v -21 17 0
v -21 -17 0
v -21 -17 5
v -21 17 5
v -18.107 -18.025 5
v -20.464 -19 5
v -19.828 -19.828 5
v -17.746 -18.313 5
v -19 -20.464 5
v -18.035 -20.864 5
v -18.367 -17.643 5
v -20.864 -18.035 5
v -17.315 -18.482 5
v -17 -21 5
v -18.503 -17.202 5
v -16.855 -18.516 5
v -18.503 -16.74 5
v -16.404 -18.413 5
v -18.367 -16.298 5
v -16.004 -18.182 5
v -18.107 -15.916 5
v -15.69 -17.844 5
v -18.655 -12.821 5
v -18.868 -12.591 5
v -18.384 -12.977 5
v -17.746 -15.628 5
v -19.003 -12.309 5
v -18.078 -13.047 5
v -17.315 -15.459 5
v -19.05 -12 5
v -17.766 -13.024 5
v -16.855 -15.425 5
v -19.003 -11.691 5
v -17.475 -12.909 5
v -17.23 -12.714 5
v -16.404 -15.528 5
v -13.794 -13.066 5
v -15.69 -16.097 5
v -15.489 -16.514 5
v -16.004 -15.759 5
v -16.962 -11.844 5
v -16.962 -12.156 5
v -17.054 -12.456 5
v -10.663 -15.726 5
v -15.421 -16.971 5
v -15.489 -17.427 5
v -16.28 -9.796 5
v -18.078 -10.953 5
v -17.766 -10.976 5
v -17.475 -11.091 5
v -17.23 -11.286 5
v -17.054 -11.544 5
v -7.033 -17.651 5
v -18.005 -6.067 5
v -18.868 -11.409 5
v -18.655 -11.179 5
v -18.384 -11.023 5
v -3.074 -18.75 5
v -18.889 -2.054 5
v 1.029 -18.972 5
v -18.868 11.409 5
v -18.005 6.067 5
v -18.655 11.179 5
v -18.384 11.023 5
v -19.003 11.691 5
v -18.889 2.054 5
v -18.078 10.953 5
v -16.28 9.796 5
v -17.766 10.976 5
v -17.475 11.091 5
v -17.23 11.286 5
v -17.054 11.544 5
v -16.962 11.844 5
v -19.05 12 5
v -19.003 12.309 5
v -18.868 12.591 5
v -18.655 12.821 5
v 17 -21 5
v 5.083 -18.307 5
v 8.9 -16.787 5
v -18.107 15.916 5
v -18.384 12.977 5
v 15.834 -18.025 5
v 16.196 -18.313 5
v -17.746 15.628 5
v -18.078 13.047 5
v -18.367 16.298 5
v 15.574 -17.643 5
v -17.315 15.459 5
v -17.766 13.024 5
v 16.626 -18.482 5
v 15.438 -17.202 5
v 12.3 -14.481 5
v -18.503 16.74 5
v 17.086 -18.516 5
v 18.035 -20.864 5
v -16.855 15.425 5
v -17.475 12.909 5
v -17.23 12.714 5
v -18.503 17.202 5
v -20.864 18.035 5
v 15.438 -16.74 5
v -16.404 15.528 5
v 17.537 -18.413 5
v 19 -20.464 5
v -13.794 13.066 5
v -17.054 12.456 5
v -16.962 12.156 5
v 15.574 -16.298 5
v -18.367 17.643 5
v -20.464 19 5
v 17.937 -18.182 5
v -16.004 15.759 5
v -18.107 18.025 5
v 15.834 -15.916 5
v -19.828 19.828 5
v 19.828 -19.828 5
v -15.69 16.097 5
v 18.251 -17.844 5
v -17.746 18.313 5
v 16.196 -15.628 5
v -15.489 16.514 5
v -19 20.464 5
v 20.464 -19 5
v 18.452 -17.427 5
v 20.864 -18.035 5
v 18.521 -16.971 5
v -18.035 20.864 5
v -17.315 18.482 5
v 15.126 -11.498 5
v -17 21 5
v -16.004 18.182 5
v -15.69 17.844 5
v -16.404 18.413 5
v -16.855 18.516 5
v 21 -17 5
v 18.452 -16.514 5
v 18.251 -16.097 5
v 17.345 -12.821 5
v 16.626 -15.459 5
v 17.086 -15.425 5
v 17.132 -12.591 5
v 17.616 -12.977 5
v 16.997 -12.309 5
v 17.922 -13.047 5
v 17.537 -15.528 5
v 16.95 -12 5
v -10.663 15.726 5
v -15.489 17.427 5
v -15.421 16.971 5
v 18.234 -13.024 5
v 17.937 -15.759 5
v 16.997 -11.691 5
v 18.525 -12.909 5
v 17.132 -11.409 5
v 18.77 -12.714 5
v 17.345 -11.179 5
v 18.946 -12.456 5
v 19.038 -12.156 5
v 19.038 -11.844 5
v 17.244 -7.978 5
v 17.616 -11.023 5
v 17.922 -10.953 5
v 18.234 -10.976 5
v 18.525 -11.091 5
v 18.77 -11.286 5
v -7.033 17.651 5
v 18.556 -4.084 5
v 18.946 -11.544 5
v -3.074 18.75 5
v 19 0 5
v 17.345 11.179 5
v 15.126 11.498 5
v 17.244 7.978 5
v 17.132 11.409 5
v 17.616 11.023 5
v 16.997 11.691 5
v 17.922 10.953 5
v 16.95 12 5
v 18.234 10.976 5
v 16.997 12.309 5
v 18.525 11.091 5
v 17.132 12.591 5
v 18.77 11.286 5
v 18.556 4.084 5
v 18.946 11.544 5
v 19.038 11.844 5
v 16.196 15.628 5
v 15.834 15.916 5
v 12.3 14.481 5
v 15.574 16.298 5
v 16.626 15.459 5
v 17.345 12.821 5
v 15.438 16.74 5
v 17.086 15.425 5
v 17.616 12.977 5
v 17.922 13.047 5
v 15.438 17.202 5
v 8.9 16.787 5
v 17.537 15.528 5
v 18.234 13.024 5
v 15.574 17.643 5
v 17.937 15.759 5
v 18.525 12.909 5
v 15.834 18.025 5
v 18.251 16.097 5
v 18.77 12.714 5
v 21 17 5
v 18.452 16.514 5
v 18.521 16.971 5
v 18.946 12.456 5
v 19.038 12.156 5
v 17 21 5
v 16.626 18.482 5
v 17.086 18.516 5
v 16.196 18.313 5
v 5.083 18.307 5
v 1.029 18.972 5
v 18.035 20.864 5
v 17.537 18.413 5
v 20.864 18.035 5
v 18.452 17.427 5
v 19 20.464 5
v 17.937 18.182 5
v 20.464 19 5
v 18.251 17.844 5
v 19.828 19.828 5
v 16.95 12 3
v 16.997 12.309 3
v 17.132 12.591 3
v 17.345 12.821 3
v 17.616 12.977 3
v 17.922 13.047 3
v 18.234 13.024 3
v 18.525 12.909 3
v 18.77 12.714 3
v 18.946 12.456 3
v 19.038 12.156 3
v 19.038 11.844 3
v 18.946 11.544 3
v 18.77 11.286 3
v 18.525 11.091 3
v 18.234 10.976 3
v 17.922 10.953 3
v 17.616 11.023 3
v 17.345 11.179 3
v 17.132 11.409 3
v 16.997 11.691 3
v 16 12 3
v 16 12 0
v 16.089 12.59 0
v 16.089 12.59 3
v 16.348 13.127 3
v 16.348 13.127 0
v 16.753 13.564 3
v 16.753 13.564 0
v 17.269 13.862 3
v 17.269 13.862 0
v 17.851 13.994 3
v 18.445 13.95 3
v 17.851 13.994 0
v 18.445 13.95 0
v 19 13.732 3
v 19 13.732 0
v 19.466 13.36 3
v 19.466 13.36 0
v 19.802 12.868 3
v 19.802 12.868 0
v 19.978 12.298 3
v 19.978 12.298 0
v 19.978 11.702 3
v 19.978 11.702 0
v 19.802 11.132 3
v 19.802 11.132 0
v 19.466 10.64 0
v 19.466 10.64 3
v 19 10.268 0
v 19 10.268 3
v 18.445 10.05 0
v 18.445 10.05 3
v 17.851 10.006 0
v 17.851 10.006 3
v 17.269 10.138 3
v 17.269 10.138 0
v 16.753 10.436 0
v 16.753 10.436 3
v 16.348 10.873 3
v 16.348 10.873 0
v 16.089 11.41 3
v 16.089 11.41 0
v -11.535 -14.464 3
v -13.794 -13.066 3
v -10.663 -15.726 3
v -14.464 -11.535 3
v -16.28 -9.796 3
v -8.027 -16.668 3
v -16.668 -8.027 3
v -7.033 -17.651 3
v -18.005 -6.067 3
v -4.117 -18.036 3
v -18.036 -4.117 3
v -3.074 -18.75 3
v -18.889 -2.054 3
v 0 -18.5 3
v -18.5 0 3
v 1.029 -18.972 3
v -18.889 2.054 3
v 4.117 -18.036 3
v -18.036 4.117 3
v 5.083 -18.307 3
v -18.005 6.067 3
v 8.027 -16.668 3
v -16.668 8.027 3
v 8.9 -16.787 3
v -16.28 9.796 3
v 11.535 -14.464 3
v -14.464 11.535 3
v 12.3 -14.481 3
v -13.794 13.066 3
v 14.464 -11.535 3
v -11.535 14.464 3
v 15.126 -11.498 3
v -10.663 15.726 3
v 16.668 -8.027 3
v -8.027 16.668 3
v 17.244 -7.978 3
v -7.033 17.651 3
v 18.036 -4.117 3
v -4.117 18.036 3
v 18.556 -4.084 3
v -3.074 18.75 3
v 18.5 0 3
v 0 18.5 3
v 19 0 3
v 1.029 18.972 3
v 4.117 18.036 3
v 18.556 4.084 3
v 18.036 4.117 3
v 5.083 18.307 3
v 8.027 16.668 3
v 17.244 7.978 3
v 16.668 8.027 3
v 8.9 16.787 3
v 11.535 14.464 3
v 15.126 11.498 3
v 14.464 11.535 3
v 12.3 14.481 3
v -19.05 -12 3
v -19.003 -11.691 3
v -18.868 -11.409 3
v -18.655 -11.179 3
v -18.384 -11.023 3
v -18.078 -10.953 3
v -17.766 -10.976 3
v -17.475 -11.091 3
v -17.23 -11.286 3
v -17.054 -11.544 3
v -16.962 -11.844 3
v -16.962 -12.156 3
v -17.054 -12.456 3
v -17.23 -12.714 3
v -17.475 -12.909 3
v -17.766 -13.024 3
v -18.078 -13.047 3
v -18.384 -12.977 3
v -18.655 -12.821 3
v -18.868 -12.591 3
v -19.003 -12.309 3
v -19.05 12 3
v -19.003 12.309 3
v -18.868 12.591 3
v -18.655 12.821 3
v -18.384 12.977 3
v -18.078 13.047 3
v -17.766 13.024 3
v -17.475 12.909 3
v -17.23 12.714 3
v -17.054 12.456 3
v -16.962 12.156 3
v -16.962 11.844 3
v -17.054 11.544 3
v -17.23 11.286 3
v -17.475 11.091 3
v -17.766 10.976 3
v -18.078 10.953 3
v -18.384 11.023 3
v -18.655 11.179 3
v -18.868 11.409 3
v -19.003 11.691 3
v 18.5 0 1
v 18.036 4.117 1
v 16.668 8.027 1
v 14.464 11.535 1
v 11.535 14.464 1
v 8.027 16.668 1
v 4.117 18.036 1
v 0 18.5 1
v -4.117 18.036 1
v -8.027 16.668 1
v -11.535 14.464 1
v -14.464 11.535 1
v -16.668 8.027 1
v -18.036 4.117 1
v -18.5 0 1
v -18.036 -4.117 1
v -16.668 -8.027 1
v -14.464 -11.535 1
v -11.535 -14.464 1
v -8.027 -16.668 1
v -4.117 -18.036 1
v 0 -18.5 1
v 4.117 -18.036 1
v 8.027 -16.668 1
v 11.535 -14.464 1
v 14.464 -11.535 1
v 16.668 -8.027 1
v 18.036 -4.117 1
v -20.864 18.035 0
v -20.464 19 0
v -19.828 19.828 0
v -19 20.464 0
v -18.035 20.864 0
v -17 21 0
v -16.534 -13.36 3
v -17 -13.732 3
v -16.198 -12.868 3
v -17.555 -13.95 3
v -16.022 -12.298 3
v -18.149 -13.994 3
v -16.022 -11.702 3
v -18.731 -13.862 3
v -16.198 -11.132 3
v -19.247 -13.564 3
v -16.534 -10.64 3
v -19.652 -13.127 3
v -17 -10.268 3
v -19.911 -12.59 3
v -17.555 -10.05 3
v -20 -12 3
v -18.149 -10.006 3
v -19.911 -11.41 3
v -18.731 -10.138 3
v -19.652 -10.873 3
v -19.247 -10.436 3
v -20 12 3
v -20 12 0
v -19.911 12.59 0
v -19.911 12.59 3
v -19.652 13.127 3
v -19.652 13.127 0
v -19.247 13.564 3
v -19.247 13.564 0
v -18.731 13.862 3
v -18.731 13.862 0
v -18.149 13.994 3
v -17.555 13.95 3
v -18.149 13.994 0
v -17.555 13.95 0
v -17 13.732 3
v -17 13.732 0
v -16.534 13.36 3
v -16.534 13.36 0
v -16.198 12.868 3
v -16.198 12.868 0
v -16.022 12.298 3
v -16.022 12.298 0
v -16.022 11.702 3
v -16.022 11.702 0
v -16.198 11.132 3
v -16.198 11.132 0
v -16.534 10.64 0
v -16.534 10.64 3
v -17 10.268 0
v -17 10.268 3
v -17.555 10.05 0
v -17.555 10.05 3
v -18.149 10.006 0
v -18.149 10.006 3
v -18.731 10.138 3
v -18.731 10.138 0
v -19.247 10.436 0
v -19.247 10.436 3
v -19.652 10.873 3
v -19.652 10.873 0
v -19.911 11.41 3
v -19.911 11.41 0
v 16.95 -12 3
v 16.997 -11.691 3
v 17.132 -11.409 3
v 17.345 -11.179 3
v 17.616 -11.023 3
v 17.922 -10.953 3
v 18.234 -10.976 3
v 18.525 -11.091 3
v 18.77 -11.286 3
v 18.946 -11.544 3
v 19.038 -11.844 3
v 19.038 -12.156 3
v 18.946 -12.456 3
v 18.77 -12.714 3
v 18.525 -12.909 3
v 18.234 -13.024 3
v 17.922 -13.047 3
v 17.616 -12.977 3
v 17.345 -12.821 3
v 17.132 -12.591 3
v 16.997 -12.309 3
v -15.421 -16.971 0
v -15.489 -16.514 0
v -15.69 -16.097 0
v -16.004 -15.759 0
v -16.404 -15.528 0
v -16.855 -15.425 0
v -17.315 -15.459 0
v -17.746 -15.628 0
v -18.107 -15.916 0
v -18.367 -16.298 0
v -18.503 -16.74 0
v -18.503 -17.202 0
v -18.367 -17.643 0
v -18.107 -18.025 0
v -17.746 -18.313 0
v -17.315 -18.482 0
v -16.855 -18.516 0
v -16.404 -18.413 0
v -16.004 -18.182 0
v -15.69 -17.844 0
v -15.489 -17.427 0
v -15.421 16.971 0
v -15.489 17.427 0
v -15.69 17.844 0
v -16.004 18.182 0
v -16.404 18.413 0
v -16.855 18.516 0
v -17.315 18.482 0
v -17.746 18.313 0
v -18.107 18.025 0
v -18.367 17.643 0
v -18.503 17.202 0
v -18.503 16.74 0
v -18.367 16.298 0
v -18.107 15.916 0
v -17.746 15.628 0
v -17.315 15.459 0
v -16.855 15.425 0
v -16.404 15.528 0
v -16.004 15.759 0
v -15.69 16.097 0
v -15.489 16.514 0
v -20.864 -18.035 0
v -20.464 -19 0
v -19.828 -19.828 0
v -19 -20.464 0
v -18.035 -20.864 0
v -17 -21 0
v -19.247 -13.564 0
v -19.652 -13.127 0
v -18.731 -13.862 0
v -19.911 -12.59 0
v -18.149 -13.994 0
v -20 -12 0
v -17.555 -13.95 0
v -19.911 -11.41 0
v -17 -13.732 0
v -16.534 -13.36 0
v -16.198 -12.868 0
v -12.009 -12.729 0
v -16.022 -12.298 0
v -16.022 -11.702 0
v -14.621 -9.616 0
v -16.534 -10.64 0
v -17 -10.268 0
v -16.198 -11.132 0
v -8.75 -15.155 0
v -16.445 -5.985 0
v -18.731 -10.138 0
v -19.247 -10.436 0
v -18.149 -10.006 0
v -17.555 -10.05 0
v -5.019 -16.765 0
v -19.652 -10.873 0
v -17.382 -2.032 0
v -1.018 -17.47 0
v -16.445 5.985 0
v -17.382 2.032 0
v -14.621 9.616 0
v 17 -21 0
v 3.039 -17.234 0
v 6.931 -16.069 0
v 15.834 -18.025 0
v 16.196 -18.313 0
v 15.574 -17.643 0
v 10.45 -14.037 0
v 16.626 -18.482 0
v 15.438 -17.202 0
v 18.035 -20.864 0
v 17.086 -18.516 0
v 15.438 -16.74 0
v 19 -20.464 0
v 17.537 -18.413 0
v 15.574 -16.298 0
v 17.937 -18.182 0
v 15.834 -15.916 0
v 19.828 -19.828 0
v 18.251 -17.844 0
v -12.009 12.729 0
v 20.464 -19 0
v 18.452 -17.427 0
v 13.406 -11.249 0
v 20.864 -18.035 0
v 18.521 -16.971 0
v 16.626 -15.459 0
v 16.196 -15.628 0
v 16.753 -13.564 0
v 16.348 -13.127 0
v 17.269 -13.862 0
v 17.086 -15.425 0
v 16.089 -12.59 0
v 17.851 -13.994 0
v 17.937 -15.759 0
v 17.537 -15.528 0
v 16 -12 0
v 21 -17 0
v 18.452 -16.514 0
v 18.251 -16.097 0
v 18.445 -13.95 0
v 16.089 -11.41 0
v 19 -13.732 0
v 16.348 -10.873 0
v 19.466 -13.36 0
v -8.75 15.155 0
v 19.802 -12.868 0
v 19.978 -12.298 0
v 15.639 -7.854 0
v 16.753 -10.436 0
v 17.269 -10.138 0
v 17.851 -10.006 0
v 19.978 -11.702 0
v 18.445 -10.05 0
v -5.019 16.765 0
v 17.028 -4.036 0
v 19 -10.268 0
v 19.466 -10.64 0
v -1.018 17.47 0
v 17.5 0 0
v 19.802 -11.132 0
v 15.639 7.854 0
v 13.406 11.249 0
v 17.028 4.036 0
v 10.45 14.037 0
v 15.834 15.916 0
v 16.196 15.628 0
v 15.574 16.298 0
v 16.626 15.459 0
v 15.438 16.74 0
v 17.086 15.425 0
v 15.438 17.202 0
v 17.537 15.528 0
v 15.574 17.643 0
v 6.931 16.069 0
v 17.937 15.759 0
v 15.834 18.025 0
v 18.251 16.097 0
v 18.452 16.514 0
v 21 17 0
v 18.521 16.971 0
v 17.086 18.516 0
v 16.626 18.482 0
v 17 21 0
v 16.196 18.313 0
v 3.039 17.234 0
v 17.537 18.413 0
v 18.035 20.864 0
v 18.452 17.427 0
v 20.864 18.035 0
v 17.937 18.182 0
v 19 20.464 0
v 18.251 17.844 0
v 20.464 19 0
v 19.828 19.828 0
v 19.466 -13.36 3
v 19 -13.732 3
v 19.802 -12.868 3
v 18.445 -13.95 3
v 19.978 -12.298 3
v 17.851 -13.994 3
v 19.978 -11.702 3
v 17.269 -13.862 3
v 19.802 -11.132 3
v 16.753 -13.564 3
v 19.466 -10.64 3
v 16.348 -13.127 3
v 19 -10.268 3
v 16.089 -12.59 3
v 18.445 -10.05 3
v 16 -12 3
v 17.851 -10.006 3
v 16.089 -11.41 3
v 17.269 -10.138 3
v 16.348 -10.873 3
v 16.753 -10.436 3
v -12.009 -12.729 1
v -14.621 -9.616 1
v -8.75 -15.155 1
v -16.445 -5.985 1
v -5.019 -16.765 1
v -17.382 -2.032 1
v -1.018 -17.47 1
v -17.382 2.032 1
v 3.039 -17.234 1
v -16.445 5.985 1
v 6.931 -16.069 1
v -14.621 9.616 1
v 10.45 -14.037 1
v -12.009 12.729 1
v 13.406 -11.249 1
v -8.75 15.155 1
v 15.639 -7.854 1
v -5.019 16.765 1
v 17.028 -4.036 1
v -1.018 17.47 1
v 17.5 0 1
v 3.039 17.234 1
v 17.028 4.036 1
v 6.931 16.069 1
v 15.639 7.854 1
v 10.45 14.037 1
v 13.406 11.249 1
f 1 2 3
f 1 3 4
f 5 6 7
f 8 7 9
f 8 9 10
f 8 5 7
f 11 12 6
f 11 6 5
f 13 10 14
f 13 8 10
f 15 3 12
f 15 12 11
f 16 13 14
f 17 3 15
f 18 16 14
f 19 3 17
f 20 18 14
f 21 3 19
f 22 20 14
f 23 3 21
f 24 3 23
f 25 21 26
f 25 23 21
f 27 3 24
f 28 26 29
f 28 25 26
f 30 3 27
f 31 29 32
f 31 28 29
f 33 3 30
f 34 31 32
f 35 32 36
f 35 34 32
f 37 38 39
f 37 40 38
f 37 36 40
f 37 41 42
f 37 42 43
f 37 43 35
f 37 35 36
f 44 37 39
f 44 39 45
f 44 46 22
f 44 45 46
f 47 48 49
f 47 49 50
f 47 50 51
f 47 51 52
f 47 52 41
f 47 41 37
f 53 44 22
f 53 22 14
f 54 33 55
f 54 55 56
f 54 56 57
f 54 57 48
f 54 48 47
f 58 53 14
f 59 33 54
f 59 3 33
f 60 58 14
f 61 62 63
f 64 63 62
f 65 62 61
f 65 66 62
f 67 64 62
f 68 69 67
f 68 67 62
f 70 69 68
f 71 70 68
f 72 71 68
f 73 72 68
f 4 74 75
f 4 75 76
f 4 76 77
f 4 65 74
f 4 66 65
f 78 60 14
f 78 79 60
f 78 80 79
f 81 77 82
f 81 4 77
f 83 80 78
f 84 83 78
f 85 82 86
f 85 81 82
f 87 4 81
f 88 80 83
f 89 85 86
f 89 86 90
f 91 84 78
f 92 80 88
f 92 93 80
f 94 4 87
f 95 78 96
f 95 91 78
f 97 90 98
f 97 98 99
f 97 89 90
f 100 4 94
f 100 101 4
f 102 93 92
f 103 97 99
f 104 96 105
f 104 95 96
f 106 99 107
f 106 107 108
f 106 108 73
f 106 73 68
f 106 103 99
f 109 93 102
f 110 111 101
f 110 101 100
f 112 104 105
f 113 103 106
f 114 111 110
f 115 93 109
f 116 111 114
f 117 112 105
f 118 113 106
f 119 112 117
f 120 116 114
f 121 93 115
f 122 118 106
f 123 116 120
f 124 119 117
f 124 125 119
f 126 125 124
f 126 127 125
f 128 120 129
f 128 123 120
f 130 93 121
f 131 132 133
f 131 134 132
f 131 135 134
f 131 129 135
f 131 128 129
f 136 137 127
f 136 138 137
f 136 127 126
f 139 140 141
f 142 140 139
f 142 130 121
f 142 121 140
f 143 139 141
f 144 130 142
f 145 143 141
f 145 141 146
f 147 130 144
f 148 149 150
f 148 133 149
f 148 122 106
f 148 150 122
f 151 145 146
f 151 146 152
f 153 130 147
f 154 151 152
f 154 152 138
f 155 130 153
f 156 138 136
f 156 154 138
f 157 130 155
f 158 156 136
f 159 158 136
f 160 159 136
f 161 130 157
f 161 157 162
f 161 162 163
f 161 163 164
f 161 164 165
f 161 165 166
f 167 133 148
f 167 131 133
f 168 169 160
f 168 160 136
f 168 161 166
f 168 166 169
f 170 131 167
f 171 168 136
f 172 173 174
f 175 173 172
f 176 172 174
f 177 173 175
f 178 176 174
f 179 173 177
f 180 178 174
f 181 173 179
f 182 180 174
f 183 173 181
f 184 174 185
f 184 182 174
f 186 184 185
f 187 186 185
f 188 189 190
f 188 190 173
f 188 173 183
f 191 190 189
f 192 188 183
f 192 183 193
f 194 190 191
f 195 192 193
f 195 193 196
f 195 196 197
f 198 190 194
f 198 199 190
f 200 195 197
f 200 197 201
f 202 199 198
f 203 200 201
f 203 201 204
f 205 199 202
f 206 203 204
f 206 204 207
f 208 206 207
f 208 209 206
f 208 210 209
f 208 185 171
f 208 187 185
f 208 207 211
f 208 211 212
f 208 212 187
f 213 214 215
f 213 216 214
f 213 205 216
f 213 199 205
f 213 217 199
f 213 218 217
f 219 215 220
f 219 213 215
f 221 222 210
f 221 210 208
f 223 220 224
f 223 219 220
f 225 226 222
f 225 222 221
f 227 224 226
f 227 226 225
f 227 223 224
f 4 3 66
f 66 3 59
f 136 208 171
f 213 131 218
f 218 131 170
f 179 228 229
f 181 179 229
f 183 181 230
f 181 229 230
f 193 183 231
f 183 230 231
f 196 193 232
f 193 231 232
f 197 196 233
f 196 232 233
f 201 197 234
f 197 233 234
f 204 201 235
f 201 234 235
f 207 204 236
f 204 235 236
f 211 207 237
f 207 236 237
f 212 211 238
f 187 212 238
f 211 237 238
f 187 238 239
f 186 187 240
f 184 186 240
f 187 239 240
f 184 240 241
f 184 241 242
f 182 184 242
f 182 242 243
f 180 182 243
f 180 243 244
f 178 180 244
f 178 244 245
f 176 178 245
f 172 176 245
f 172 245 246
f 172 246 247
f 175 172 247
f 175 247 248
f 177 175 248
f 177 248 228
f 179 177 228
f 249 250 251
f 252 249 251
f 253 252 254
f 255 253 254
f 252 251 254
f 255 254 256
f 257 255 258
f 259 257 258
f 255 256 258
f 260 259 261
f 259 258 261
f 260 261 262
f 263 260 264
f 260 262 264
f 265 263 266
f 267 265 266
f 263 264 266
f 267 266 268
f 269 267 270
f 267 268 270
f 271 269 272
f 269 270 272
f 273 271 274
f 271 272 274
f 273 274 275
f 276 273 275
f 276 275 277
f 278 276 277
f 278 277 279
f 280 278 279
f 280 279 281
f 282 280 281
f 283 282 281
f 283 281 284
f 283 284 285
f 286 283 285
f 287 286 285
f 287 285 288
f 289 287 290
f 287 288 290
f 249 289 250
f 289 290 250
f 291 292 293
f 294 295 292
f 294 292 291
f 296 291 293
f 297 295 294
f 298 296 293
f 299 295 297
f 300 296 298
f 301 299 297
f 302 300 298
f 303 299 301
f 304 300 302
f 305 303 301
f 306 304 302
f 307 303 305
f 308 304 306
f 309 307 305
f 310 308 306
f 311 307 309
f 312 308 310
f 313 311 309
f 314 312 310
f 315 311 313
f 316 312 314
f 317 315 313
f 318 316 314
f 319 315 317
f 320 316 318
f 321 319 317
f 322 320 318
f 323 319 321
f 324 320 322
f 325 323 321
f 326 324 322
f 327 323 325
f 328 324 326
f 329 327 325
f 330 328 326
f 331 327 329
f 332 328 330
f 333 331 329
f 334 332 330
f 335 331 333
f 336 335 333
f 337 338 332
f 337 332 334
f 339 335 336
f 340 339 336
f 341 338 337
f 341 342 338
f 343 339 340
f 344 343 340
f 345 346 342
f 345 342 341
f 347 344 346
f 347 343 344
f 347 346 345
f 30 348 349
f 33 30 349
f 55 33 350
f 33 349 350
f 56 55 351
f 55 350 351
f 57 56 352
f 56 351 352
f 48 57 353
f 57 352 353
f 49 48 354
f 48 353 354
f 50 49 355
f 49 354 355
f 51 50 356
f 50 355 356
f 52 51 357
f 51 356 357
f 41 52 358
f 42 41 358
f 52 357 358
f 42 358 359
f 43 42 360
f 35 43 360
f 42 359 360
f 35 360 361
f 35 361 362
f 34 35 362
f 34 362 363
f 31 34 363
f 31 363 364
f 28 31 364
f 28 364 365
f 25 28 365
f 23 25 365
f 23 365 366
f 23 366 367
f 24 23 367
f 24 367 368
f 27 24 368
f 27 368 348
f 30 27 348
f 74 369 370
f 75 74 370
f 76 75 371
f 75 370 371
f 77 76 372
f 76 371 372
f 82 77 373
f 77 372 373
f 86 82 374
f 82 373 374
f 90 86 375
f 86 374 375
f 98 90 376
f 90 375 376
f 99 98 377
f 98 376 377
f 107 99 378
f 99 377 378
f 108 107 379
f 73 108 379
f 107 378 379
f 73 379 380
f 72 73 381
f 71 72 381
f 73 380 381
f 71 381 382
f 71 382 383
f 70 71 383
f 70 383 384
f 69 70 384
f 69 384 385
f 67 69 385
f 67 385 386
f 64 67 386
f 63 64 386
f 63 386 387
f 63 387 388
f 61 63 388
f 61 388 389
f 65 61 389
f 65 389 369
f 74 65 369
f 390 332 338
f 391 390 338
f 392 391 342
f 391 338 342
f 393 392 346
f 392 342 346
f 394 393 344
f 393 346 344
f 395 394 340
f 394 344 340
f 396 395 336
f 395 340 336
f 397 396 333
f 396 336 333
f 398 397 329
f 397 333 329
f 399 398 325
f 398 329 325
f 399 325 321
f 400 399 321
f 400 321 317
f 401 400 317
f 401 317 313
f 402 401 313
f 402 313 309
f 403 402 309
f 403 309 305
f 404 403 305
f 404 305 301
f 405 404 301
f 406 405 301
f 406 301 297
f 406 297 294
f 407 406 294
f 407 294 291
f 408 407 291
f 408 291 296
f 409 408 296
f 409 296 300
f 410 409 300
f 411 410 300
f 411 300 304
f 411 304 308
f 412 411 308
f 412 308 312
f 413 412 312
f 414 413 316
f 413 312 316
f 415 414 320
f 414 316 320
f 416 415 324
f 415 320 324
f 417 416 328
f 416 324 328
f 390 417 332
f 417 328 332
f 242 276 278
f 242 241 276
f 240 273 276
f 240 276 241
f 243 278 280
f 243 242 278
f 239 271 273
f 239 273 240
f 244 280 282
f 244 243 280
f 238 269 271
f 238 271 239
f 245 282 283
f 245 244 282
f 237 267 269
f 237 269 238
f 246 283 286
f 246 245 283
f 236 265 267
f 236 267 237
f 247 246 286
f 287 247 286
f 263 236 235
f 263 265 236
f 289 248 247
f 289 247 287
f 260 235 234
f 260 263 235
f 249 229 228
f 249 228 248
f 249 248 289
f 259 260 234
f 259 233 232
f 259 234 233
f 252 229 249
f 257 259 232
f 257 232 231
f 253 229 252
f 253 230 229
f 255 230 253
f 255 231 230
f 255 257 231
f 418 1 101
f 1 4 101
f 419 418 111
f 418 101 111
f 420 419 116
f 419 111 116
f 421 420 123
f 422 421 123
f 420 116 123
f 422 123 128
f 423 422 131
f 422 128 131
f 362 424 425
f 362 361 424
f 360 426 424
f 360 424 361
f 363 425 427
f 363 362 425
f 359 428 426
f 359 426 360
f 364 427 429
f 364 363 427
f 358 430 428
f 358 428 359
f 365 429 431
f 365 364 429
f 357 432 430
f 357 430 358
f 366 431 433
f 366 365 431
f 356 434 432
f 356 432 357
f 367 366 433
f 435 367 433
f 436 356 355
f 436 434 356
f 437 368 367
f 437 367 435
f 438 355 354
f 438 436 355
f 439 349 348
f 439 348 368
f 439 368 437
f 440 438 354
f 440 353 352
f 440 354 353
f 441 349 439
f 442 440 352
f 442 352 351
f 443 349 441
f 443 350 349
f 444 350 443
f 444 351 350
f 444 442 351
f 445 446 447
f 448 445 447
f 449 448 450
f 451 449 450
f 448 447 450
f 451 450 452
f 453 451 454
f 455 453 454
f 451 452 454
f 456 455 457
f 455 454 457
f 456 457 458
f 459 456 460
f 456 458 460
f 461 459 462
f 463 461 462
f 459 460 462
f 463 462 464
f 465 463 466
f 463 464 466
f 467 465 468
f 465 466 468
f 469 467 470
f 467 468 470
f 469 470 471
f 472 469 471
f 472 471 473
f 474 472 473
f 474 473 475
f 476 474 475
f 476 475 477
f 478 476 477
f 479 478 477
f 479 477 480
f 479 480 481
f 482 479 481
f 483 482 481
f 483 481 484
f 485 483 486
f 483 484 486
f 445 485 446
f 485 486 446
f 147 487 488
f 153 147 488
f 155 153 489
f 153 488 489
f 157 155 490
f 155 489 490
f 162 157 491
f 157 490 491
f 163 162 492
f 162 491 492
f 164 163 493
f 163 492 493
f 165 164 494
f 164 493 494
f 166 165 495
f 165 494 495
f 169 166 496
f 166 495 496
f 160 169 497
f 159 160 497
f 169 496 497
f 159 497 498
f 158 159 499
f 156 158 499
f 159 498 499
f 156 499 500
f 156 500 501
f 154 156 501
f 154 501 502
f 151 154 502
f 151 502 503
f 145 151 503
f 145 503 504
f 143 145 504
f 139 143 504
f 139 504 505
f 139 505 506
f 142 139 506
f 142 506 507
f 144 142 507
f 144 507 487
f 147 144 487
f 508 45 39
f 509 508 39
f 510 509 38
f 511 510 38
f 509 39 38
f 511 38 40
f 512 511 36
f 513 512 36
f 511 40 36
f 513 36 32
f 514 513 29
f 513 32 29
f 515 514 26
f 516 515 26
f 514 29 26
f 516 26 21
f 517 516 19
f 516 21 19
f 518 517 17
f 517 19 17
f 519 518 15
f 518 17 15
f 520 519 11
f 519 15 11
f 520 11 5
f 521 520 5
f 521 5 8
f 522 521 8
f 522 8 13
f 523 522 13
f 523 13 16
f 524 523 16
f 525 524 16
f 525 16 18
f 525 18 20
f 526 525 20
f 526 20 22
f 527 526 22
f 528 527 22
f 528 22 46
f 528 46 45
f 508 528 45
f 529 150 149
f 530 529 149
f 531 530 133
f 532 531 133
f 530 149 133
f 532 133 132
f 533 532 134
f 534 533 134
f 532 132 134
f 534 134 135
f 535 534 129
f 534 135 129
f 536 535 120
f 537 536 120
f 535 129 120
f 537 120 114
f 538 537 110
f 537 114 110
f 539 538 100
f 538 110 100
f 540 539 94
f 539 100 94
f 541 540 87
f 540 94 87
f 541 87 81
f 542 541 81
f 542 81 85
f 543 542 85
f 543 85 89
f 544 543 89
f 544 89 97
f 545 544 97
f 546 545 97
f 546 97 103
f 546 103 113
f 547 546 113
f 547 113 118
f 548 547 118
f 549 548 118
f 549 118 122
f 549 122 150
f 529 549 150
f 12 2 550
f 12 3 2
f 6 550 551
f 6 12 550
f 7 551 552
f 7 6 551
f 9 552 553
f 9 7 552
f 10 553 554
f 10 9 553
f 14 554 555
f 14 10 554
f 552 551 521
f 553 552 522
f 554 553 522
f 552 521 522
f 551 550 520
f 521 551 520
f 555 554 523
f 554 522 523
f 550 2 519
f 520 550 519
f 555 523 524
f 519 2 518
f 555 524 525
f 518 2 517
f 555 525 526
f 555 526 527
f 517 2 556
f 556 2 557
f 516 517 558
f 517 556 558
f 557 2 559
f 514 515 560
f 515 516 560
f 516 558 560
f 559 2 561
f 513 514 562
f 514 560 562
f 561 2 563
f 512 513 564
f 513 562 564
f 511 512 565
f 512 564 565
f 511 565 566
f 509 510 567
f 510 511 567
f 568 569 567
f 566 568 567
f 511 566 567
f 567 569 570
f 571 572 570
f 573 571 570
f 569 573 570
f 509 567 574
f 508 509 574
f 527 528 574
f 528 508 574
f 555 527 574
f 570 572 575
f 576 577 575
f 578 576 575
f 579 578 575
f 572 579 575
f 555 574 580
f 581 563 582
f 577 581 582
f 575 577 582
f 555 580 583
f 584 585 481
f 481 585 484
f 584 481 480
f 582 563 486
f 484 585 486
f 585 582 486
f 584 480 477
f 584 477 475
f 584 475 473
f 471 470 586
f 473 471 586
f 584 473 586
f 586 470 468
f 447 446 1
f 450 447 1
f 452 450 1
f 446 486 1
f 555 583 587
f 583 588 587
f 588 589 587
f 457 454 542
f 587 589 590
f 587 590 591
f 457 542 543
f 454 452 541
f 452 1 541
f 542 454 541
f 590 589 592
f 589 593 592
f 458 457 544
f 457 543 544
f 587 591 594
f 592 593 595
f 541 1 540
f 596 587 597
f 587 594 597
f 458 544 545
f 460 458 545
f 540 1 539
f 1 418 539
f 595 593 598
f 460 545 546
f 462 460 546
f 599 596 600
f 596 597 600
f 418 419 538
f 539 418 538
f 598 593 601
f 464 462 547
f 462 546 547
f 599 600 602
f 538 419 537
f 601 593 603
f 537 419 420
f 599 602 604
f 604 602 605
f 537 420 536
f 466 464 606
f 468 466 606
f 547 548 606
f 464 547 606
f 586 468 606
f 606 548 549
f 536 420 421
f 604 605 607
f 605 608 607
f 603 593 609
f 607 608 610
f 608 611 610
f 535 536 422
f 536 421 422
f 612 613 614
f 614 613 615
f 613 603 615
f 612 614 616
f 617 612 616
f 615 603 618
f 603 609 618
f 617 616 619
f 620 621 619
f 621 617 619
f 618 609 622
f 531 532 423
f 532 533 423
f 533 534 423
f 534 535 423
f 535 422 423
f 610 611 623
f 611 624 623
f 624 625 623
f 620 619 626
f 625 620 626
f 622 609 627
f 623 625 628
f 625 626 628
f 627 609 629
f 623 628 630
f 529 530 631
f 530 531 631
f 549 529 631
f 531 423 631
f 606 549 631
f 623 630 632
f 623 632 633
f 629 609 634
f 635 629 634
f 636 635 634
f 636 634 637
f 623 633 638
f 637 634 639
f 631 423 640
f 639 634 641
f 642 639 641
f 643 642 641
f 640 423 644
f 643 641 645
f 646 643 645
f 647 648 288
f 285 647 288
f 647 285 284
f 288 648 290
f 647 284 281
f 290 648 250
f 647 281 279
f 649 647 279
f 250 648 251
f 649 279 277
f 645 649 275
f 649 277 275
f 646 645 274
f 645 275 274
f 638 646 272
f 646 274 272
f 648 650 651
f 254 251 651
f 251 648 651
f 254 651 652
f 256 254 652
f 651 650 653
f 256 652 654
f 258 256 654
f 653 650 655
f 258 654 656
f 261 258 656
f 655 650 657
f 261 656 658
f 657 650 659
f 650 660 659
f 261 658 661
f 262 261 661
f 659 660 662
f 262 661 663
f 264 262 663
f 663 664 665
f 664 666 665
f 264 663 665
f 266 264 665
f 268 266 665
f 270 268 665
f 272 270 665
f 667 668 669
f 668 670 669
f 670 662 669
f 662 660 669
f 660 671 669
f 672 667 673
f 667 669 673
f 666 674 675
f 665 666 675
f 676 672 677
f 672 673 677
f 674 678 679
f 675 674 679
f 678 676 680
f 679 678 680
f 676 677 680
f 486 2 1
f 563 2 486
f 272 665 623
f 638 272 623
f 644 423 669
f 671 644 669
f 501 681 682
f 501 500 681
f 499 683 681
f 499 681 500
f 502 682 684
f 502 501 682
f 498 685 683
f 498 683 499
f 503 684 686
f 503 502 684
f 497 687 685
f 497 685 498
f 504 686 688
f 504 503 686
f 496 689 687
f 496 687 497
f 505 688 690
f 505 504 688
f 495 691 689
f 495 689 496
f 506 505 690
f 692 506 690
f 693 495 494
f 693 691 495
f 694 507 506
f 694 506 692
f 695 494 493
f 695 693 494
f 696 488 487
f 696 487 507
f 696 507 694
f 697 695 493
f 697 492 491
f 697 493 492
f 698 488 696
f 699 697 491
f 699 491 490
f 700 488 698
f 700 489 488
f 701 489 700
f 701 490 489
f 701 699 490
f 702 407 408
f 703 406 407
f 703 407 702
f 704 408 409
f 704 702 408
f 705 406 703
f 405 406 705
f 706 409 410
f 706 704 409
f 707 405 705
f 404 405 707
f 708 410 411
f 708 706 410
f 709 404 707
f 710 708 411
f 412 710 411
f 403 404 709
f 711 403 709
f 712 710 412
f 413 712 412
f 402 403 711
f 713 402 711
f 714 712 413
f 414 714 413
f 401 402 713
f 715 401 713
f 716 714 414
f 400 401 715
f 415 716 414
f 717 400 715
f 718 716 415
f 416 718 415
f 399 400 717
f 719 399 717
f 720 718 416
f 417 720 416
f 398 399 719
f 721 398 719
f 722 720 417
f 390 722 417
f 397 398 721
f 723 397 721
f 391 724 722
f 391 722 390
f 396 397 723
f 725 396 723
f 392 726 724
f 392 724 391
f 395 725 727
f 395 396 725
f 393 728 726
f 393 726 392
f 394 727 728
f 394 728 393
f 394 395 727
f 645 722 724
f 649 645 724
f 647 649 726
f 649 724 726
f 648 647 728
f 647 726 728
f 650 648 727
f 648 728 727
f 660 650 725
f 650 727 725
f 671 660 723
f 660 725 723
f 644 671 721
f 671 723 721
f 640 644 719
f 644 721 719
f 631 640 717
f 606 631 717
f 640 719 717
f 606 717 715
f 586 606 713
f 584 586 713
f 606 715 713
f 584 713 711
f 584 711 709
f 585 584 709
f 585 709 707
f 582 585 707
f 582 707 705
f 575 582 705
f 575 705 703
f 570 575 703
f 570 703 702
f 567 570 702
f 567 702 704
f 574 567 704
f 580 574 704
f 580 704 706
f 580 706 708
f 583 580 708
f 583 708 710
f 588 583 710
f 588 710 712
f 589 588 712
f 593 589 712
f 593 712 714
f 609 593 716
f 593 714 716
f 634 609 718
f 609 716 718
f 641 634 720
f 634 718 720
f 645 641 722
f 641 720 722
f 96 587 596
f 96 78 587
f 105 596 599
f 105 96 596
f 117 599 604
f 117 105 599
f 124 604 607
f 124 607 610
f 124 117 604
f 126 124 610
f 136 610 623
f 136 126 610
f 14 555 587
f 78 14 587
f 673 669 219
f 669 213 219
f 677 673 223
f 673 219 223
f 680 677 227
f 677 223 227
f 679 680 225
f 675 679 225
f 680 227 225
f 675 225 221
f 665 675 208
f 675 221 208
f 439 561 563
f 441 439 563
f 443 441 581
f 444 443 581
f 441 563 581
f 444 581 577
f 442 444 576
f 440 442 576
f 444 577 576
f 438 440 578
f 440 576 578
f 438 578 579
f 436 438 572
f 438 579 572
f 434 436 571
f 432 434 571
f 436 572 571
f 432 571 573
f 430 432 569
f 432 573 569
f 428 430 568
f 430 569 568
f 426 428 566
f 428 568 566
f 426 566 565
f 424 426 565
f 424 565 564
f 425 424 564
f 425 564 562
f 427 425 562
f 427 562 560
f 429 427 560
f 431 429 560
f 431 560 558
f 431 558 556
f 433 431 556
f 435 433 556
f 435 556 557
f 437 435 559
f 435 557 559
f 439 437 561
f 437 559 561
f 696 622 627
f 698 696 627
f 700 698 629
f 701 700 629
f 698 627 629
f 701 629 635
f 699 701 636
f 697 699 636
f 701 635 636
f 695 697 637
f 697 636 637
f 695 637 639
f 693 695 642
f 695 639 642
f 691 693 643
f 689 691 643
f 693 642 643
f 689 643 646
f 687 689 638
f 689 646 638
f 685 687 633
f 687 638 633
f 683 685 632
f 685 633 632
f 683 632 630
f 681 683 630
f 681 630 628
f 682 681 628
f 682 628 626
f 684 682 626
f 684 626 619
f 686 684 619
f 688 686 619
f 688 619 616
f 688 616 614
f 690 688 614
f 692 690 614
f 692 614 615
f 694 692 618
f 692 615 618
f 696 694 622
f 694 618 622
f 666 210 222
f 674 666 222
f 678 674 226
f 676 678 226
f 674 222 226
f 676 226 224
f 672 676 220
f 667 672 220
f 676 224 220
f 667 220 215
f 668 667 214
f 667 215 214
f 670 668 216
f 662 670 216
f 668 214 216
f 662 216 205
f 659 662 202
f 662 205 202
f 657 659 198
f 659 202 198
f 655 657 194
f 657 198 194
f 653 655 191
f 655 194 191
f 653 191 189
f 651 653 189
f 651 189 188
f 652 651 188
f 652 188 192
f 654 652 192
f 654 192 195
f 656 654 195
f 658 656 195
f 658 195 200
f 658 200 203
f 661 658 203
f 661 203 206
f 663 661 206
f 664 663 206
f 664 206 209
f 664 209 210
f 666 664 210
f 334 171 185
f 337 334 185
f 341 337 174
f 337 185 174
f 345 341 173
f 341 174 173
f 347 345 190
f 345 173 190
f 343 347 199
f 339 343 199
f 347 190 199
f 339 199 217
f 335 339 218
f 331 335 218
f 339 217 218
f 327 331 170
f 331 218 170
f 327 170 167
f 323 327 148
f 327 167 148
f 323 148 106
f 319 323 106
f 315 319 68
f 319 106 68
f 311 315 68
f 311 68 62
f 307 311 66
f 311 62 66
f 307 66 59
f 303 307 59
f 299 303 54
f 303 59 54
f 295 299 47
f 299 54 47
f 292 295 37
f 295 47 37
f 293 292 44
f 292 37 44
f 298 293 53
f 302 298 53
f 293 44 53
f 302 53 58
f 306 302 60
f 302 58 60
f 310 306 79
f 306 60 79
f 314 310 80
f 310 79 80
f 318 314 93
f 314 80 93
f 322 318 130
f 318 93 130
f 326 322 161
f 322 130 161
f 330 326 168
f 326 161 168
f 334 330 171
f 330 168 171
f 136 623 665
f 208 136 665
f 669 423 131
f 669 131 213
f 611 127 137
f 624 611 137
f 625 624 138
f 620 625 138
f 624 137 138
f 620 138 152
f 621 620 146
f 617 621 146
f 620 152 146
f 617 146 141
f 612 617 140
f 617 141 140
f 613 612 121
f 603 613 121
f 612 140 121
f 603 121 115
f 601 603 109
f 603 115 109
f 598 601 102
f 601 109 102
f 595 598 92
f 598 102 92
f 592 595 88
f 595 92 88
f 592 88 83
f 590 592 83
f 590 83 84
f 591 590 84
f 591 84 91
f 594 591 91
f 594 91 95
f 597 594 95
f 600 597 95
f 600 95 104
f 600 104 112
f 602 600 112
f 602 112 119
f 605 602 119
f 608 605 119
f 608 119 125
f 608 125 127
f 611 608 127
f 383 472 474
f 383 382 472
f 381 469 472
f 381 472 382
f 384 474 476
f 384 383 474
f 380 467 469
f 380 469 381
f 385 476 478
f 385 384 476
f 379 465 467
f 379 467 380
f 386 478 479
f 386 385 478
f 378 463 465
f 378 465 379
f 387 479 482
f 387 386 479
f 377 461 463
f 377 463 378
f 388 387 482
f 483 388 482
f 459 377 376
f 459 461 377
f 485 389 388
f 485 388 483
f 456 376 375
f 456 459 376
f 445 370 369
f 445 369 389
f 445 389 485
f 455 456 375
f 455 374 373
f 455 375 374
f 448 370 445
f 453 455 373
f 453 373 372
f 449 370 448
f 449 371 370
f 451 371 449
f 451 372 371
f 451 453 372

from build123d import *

# Parameters (mm, degrees)
SKETCH_1_W          = 42
SKETCH_1_H          = 42
EXTRUDE_1_DEPTH     = 5
SKETCH_2_R          = 17.5
CUT_EXTRUDE_1_DEPTH = 6
SKETCH_3_R          = 18.5
CUT_EXTRUDE_2_DEPTH = 4
SKETCH_4_R          = 19
CUT_EXTRUDE_3_DEPTH = 2
FILLET_1_R          = 4
SKETCH_5_R          = 1.55
CUT_EXTRUDE_4_DEPTH = 6
SKETCH_7_R          = 1.05
CUT_EXTRUDE_5_DEPTH = 6
SKETCH_8_R          = 2
CUT_EXTRUDE_6_DEPTH = 3


with BuildPart() as part:
    # 草图1 → 凸台-拉伸1 (new body)
    with BuildSketch(Plane.XY):
        Rectangle(SKETCH_1_W, SKETCH_1_H)
    extrude(amount=EXTRUDE_1_DEPTH)

    # 草图2 → 切除-拉伸1 (cut, through all)
    with BuildSketch(Plane.XY.offset(5)):
        Circle(SKETCH_2_R)
    extrude(amount=-CUT_EXTRUDE_1_DEPTH, mode=Mode.SUBTRACT)

    # 草图3 → 切除-拉伸2 (cut)
    with BuildSketch(Plane.XY.offset(5)):
        Circle(SKETCH_3_R)
    extrude(amount=-CUT_EXTRUDE_2_DEPTH, mode=Mode.SUBTRACT)

    # 草图4 → 切除-拉伸3 (cut)
    with BuildSketch(Plane.XY.offset(5)):
        Circle(SKETCH_4_R)
    extrude(amount=-CUT_EXTRUDE_3_DEPTH, mode=Mode.SUBTRACT)

    # 圆角1
    fillet_1_edges = [part.edges().sort_by_distance(p)[0] for p in [
        (21, -21, 2.5),
        (-21, -21, 2.5),
        (-21, 21, 2.5),
        (21, 21, 2.5),
    ]]
    fillet(fillet_1_edges, radius=FILLET_1_R)

    # 草图5 → 切除-拉伸4 (cut, through all)
    with BuildSketch(Plane.XY.offset(5)):
        with Locations((-16.970562748, 16.970562748)):
            Circle(SKETCH_5_R)
        with Locations((16.970562748, 16.970562748)):
            Circle(SKETCH_5_R)
        with Locations((16.970562748, -16.970562748)):
            Circle(SKETCH_5_R)
        with Locations((-16.970562748, -16.970562748)):
            Circle(SKETCH_5_R)
    extrude(amount=-CUT_EXTRUDE_4_DEPTH, mode=Mode.SUBTRACT)

    # 草图7 → 切除-拉伸5 (cut, through all)
    with BuildSketch(Plane(origin=(0, 0, 0), x_dir=(-1, 0, 0), z_dir=(0, 0, -1))):
        with Locations((-18, 12)):
            Circle(SKETCH_7_R)
        with Locations((18, 12)):
            Circle(SKETCH_7_R)
        with Locations((18, -12)):
            Circle(SKETCH_7_R)
        with Locations((-18, -12)):
            Circle(SKETCH_7_R)
    extrude(amount=-CUT_EXTRUDE_5_DEPTH, mode=Mode.SUBTRACT)

    # 草图8 → 切除-拉伸6 (cut)
    with BuildSketch(Plane(origin=(0, 0, 0), x_dir=(-1, 0, 0), z_dir=(0, 0, -1))):
        with Locations((-18, 12)):
            Circle(SKETCH_8_R)
        with Locations((18, 12)):
            Circle(SKETCH_8_R)
        with Locations((18, -12)):
            Circle(SKETCH_8_R)
        with Locations((-18, -12)):
            Circle(SKETCH_8_R)
    extrude(amount=-CUT_EXTRUDE_6_DEPTH, mode=Mode.SUBTRACT)


solid = part.part
